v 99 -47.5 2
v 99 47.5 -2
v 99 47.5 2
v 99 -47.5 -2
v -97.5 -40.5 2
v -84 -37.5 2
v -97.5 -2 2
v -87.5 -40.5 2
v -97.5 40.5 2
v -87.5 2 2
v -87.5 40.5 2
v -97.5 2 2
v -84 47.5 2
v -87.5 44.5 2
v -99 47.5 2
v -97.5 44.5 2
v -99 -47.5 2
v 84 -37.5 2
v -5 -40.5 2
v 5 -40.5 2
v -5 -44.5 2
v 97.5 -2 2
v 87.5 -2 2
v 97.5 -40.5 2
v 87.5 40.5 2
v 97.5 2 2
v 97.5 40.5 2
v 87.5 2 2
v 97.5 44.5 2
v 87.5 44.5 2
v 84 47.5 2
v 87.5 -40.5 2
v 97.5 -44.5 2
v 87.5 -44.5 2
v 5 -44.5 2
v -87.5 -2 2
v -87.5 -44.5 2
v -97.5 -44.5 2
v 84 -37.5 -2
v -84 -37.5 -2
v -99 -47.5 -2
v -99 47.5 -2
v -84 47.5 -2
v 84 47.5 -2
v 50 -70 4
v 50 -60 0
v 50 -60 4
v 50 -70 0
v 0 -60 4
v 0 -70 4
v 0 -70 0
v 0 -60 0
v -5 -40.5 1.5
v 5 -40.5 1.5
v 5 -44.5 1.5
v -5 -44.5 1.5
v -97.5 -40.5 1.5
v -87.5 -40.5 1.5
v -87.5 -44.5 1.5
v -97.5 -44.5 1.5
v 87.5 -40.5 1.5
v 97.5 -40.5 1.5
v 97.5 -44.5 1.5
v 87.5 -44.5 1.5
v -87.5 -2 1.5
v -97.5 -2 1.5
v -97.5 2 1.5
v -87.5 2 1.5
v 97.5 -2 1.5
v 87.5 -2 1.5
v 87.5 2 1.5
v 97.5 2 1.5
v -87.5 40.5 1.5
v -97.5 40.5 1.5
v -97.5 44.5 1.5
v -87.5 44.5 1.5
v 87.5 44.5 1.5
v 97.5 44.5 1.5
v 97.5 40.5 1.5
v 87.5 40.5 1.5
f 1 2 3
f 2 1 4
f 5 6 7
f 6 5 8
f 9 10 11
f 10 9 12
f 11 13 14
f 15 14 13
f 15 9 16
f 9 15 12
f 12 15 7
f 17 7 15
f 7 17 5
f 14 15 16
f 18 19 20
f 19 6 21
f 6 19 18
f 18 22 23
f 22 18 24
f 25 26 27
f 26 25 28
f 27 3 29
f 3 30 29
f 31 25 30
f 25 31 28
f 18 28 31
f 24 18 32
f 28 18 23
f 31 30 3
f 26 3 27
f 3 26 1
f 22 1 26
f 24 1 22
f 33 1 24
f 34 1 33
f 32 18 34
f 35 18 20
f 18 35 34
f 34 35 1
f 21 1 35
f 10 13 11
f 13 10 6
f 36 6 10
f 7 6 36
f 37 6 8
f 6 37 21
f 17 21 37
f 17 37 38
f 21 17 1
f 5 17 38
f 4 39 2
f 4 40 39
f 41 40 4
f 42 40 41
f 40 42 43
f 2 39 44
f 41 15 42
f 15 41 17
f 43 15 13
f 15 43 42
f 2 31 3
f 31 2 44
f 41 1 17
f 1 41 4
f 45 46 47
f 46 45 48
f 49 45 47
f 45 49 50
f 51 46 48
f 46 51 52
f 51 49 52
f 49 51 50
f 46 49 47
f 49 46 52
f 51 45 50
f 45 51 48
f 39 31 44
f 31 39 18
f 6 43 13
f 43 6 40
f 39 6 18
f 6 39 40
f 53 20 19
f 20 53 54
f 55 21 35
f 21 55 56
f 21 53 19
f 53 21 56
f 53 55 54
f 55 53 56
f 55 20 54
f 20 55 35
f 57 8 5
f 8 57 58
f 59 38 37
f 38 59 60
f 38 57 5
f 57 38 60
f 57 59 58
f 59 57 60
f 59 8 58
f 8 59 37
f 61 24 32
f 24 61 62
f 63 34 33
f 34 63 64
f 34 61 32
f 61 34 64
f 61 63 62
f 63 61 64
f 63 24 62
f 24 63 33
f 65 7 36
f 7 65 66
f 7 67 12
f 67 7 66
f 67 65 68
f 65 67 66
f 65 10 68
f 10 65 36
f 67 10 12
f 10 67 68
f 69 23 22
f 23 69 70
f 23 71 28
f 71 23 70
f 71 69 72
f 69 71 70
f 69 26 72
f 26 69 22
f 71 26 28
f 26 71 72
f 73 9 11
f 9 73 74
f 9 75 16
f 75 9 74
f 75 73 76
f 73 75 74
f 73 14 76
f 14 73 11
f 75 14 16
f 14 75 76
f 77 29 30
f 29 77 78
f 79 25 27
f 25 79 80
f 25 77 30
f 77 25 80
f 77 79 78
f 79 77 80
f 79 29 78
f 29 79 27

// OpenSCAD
// file: ssc_plexi_CLOCK_BOX.scad
/*////////////////////////////////////////////////////////////////////////////
//////////////////////// Unit Information  ///////////////////////////////////
//////////////////////////////////////////////////////////////////////////////
date stated   : 2021-01-30
date finished : 2021-01-30
modeler       : Olle Johansson
application   : SevenSegmentClock (ClockNet)
module        : CLOCK_BOX
version       : 0.1 beta
copyright     : Pipe Dreams / Forrest Floor
subject       : Seven Segment Clock
description   : LED Fram for attaching LED-Display in box.

version history
date            description
2021-01-21	    Start of re-design
*/
$fn = 100;

include <ssc_plexi_DIMENSIONS.scad>;
use <ssc_plexi_PANELS.scad>;


/***************************************************************************
 *
 *                                LOCAL RENDER
 *                      Used to view modules locally
 *
 ***************************************************************************/
// middleCase();

 /***************************************************************************
 *
 *                                MODULES
 *
 ***************************************************************************/


/************************************************************************************************************
 **  Module:      middleCase
 **  Parameters : None
 **  Description: Basic panel. All other panels are derived from this panel
 **              
 ************************************************************************************************************/
// module middleCase() {
//   difference() {
//     union() {
//       mainBoxBlock();

//     }
//   }
// }

/************************************************************************************************************
 **  Module:      mainBoxBlock
 **  Parameters : None
 **  Description: This is tha main, basic block constructing the middleCase
 **              
 ************************************************************************************************************/
// file: ssc_plexi_RENDER.scad
////////////////////////////////////////////////////////////////////////
//////////////////////// Unit Information  ///////////////////////////////////
/*//////////////////////////////////////////////////////////////////////
date stated   : 2021-01-30
date finished : 2021-01-30
modeler       : Olle Johansson
application   : SevenSegment RENDER File
module        : RENDER
version       : 0.1 beta
copyright     : Pipe Dreams / Forrest Floor
subject       : Seven Segment Clock

version history
date            description
2021-01-30	    Start of design

*/
$fn = $preview ? 10 : 20; //64;

/** INCLUDE FILES **/
include <ssc_plexi_DIMENSIONS.scad>;
use <ssc_plexi_CLOCK_BOX.scad>;
use <ssc_plexi_PANELS.scad>;
use <ssc_plexi_DETAIL_PARTS.scad>;

/***************************************************************************
 *
 *                                GLOBAL RENDER
 *
 ***************************************************************************/
box();



 /***************************************************************************
 *
 *                             HIGH LEVEL MODULES
 *                              NEW MAIN MODULE
 *
 ***************************************************************************/
 module box() {
   difference() {
     union() {
       /** bootom section **/
       bottomSection();

       /** top section **/
       topSection();

       /** left side section **/
       leftSideSection();

       /** right side section **/
       rightSideSection();

       /** front panel **/
       ***translate([0,-BOX_DEPTH/2 + FRONT_MATERIAL_THICKNESS/2,BOX_HEIGHT/2])
        rotate([-90,180,0])
          frontPanel();

       translate([0,-BOX_DEPTH/2 + FRONT_MATERIAL_THICKNESS/2,BOX_HEIGHT/2])
        rotate([-90,180,0])
          frontPanelExt();

       /** back panel desktop**/
       //translate([0,BACK_PANEL_DEPTH/2,BACK_PANEL_DEPTH/2])
       translate([0,BACK_PANEL_DEPTH/2+3,BACK_PANEL_DEPTH/2])
        rotate([90,0,0])
          backSecionDesktop();

       /** Corner front attachment modules **/
       /** upper left **/
      //  *translate([78.5, -36.5, 71.5,])
        //  rotate([-90, 90, 0])
          //  cornerPanelConnectorFront();
           
       translate([80.5, -34.5, 73.5])
         rotate([-90, 90, 0])
           cornerPanelFrontSharp();  

       /** lower left **/
      //  *translate([78.5, -33.5, 3.5])
        //  rotate([90, -90, 0])
          //  cornerPanelConnectorFront();           

       translate([80.5, -34.5, 1.5])
         rotate([90, -90, 0])
           cornerPanelFrontSharp();             

       /** upper right **/
      //  *translate([-78.5, -33.5, 71.5,])
        //  rotate([90, 90, 0])
          //  cornerPanelConnectorFront();

       translate([-80.5, -34.5, 73.5,])
         rotate([90, 90, 0])
           cornerPanelFrontSharp();           

       /** lower right **/
      //  *translate([-78.5, -33.5, 3.5])
        //  rotate([-90, -90, 0])
          //  cornerPanelConnectorFront();                      

       translate([-80.5, -33.5, 1.5])
         rotate([-90, -90, 0])
           cornerPanelFrontSharp();            

       /** Rear front attachment modules **/
       /** upper left **/
      //  *translate([78.5, 34.5, 7.5,])
        //  rotate([-90, 90, 0])
          //  cornerPanelConnectorRear();

       translate([80.5, 36.5, 73.5,])
         rotate([-90, 90, 0])
           cornerPanelRearSharp();           

       /** lower left **/
      //  *translate([78.5, 38.5, 3.5])
        //  rotate([90, -90, 0])
          //  cornerPanelConnectorRear();           

       translate([80.5, 36.5, 1.5])
         rotate([90, -90, 0])
           cornerPanelRearSharp();               

       /** upper right **/
      //  *translate([-78.5, 38.5, 71.5,])
        //  rotate([90, 90, 0])
          //  cornerPanelConnectorRear();

       translate([-80.5, 36.5, 73.5,])
         rotate([90, 90, 0])
           cornerPanelRearSharp();           

       /** lower right **/
      //  *translate([-78.5, 36.5, 3.5])
        //  rotate([-90, -90, 0])
          //  cornerPanelConnectorRear();           

       translate([-80.5, 36.5, 1.5])
         rotate([-90, -90, 0])
           cornerPanelRearSharp();            

       /** LDR Adaptor **/
        translate([-71.2, -42,44.5])
         rotate([90, 0, 180])
          ldrPanelAdaptor();
     }
   }
 }
// file: ssc_plexi_DIMENSIONS.scad
/** INCLUDE FILES **/



/***************************************************************************
 *
 *                            GLOBAL DIMENSION PARAMETERS
 *
 ***************************************************************************/

 /** FRONT PANEL SECTION  **/
//    FRONT_PANEL_WIDTH  = 156;
//    FRONT_PANEL_DEPTH  =  85; 
FRONT_PANEL_HEIGHT =   6;  //.. Material thickness

 /** BOTTOM PANEL BLIND VERSION **/
//  BOTTOM_PANEL_WIDTH = 164;
//  BOTTOM_PANEL_DEPTH  =  70;
// BOTTOM_PANEL_HEIGHT =   4;  //.. Material thickness

 
 /** SIDE PANEL BLIND  **/
//  SIDE_PANEL_WIDTH  = BOTTOM_PANEL_DEPTH;
//  SIDE_PANEL_DEPTH  = FRONT_PANEL_DEPTH;
//  SIDE_PANEL_HEIGHT = 4;

 /**  LED DISPLAY DIMENSIONS  **/
LED_DISPLAY_WIDTH  =  121;
LED_DISPLAY_HEIGHT =   10;  //** LED Display height without backpack pcb
LED_DISPLAY_DEPTH  =   41;

LED_DISPLAY_WIDTH_3D  =  120;
LED_DISPLAY_HEIGHT_3D =   10;  //** LED Display height without backpack pcb
LED_DISPLAY_DEPTH_3D  =   41;

 /**  LED FRAME DIMENSIONS  **/
//  LED_DISPLAY_FRAME_WIDTH  = LED_DISPLAY_WIDTH + 3;
//  LED_DISPLAY_FRAME_HEIGHT = 4;  //LED_DISPLAY_HEIGHT;
//  LED_DISPLAY_FRAME_DEPTH  = LED_DISPLAY_DEPTH + 3;

  /**  CLOCK BOX OUTSIDE DIMENSIONS  **/
//  BOX_WIDTH          = FRONT_PANEL_WIDTH + 5;  //.. Add 5 mm to get 2.5 mm thick walls, Left/Right
//  BOX_DEPTH          = FRONT_PANEL_DEPTH + 5;  //.. Add 5 mm to get 2.5 mm thisc walls, Top/Bootom
//  BOX_HEIGHT         = 65;
//  BOX_WALL_THICKNESS =  3;

 /**  CLOCK BOX INSIDE DIMENSIONS  **/
//  CLOCK_BOX_INSIDE_WIDTH = CLOCK_BOX_WIDTH - CLOCK_BOX_WALL_THICKNESS * 2;
//  CLOCK_BOX_INSIDE_DEPTH = CLOCK_BOX_DEPTH - CLOCK_BOX_WALL_THICKNESS * 2;
//  CLOCK_BOX_INSIDE_HEIGHT = CLOCK_BOX_HEIGHT;

/************************************************************************/
/*                          NEW DEFINITIONS                             */
/************************************************************************/

BOX_WIDTH = 168;
BOX_DEPTH =  85;
BOX_HEIGHT = 75;
BOX_MATERIAL_THICKNESS = 4;
FRONT_MATERIAL_THICKNESS = 6;

FRONT_TRAIL_WIDTH = 6;
COMMON_TRAIL_WIDTH = 4;

FRONT_TRAIL_HEIGHT = BOX_MATERIAL_THICKNESS / 2;
COMMON_TRAIL_HEIGHT = BOX_MATERIAL_THICKNESS / 2;

FRONT_PANEL_WIDTH = BOX_WIDTH - 4.2 ;
FRONT_PANEL_DEPTH =  BOX_HEIGHT - 0.2;

BACK_PANEL_WIDTH =  BOX_WIDTH - 4.2 ;
BACK_PANEL_DEPTH =  BOX_HEIGHT - 0.2;
// main file
/*////////////////////////////////////////////////////////////////////////////
//////////////////////// Unit Information  ///////////////////////////////////
//////////////////////////////////////////////////////////////////////////////
date stated   : 2021-02-26
date finished : 2021-02-26
modeler       : Olle Johansson
application   : SevenSegmentClock (ClockNet)
module        : Detail_Parts
version       : 0.1 beta
copyright     : Pipe Dreams / Forrest Floor
subject       : Seven Segment Clock
description   : Mounting jigg details for clockNet box

version history
date            description
2021-02-07	    Start of re-design
*/
$fn = 100;

include <ssc_plexi_DIMENSIONS.scad>;
use <ssc_plexi_PANELS.scad>;
use <ssc_plexi_RENDER.scad>;

JIGG_OUTER_WIDTH = BOX_WIDTH + 20;
JIGG_OUTER_HEIGHT = BOX_HEIGHT + 20;

/***************************************************************************
 *
 *                                LOCAL RENDER
 *                      Used to view modules locally
 *
 ***************************************************************************/
*box();
jigg();
  /***************************************************************************
 *
 *                                MODULES
 *
 ***************************************************************************/

/************************************************************************************************************
 **  Module:      jigg
 **  Parameters : None
 **  Description: Combination of connector items to simplify milling
 **              
 ************************************************************************************************************/
 module jigg() {
   difference() {
     union() {
       cube([JIGG_OUTER_WIDTH + 10, JIGG_OUTER_HEIGHT, 4],center=true);
       
       translate([0,-70,0])
         cube([50,10,4]);
     }
     translate([0,5,0])
       cube([BOX_WIDTH, BOX_DEPTH, BOX_HEIGHT],center= true);
    
    /** base centar bar **/
    translate([0, -42.5, 2])
      rotate([0, 0, 90])
        cube([4,,10,1],center=true);

   /** base left bar **/
    translate([-92.5, -42.5, 2])
      rotate([0, 0, 90])
        cube([4,,10,1],center=true);

   /** base right bar **/
       translate([92.5, -42.5, 2])
      rotate([0, 0, 90])
        cube([4,,10,1],center=true);        

   /** center left bar **/
    translate([-92.5, 0, 2])
      rotate([0, 0, 90])
        cube([4,,10,1],center=true);                

    /** center right bar **/
    translate([92.5, 0, 2])
      rotate([0, 0, 90])
        cube([4,,10,1],center=true);

    /** top left bar **/
    translate([-92.5, 42.5, 2])
      rotate([0, 0, 90])
        cube([4,,10,1],center=true);                                

    /** top right bar **/
    translate([92.5, 42.5, 2])
      rotate([0, 0, 90])
        cube([4,,10,1],center=true);                                        

   }
 }
